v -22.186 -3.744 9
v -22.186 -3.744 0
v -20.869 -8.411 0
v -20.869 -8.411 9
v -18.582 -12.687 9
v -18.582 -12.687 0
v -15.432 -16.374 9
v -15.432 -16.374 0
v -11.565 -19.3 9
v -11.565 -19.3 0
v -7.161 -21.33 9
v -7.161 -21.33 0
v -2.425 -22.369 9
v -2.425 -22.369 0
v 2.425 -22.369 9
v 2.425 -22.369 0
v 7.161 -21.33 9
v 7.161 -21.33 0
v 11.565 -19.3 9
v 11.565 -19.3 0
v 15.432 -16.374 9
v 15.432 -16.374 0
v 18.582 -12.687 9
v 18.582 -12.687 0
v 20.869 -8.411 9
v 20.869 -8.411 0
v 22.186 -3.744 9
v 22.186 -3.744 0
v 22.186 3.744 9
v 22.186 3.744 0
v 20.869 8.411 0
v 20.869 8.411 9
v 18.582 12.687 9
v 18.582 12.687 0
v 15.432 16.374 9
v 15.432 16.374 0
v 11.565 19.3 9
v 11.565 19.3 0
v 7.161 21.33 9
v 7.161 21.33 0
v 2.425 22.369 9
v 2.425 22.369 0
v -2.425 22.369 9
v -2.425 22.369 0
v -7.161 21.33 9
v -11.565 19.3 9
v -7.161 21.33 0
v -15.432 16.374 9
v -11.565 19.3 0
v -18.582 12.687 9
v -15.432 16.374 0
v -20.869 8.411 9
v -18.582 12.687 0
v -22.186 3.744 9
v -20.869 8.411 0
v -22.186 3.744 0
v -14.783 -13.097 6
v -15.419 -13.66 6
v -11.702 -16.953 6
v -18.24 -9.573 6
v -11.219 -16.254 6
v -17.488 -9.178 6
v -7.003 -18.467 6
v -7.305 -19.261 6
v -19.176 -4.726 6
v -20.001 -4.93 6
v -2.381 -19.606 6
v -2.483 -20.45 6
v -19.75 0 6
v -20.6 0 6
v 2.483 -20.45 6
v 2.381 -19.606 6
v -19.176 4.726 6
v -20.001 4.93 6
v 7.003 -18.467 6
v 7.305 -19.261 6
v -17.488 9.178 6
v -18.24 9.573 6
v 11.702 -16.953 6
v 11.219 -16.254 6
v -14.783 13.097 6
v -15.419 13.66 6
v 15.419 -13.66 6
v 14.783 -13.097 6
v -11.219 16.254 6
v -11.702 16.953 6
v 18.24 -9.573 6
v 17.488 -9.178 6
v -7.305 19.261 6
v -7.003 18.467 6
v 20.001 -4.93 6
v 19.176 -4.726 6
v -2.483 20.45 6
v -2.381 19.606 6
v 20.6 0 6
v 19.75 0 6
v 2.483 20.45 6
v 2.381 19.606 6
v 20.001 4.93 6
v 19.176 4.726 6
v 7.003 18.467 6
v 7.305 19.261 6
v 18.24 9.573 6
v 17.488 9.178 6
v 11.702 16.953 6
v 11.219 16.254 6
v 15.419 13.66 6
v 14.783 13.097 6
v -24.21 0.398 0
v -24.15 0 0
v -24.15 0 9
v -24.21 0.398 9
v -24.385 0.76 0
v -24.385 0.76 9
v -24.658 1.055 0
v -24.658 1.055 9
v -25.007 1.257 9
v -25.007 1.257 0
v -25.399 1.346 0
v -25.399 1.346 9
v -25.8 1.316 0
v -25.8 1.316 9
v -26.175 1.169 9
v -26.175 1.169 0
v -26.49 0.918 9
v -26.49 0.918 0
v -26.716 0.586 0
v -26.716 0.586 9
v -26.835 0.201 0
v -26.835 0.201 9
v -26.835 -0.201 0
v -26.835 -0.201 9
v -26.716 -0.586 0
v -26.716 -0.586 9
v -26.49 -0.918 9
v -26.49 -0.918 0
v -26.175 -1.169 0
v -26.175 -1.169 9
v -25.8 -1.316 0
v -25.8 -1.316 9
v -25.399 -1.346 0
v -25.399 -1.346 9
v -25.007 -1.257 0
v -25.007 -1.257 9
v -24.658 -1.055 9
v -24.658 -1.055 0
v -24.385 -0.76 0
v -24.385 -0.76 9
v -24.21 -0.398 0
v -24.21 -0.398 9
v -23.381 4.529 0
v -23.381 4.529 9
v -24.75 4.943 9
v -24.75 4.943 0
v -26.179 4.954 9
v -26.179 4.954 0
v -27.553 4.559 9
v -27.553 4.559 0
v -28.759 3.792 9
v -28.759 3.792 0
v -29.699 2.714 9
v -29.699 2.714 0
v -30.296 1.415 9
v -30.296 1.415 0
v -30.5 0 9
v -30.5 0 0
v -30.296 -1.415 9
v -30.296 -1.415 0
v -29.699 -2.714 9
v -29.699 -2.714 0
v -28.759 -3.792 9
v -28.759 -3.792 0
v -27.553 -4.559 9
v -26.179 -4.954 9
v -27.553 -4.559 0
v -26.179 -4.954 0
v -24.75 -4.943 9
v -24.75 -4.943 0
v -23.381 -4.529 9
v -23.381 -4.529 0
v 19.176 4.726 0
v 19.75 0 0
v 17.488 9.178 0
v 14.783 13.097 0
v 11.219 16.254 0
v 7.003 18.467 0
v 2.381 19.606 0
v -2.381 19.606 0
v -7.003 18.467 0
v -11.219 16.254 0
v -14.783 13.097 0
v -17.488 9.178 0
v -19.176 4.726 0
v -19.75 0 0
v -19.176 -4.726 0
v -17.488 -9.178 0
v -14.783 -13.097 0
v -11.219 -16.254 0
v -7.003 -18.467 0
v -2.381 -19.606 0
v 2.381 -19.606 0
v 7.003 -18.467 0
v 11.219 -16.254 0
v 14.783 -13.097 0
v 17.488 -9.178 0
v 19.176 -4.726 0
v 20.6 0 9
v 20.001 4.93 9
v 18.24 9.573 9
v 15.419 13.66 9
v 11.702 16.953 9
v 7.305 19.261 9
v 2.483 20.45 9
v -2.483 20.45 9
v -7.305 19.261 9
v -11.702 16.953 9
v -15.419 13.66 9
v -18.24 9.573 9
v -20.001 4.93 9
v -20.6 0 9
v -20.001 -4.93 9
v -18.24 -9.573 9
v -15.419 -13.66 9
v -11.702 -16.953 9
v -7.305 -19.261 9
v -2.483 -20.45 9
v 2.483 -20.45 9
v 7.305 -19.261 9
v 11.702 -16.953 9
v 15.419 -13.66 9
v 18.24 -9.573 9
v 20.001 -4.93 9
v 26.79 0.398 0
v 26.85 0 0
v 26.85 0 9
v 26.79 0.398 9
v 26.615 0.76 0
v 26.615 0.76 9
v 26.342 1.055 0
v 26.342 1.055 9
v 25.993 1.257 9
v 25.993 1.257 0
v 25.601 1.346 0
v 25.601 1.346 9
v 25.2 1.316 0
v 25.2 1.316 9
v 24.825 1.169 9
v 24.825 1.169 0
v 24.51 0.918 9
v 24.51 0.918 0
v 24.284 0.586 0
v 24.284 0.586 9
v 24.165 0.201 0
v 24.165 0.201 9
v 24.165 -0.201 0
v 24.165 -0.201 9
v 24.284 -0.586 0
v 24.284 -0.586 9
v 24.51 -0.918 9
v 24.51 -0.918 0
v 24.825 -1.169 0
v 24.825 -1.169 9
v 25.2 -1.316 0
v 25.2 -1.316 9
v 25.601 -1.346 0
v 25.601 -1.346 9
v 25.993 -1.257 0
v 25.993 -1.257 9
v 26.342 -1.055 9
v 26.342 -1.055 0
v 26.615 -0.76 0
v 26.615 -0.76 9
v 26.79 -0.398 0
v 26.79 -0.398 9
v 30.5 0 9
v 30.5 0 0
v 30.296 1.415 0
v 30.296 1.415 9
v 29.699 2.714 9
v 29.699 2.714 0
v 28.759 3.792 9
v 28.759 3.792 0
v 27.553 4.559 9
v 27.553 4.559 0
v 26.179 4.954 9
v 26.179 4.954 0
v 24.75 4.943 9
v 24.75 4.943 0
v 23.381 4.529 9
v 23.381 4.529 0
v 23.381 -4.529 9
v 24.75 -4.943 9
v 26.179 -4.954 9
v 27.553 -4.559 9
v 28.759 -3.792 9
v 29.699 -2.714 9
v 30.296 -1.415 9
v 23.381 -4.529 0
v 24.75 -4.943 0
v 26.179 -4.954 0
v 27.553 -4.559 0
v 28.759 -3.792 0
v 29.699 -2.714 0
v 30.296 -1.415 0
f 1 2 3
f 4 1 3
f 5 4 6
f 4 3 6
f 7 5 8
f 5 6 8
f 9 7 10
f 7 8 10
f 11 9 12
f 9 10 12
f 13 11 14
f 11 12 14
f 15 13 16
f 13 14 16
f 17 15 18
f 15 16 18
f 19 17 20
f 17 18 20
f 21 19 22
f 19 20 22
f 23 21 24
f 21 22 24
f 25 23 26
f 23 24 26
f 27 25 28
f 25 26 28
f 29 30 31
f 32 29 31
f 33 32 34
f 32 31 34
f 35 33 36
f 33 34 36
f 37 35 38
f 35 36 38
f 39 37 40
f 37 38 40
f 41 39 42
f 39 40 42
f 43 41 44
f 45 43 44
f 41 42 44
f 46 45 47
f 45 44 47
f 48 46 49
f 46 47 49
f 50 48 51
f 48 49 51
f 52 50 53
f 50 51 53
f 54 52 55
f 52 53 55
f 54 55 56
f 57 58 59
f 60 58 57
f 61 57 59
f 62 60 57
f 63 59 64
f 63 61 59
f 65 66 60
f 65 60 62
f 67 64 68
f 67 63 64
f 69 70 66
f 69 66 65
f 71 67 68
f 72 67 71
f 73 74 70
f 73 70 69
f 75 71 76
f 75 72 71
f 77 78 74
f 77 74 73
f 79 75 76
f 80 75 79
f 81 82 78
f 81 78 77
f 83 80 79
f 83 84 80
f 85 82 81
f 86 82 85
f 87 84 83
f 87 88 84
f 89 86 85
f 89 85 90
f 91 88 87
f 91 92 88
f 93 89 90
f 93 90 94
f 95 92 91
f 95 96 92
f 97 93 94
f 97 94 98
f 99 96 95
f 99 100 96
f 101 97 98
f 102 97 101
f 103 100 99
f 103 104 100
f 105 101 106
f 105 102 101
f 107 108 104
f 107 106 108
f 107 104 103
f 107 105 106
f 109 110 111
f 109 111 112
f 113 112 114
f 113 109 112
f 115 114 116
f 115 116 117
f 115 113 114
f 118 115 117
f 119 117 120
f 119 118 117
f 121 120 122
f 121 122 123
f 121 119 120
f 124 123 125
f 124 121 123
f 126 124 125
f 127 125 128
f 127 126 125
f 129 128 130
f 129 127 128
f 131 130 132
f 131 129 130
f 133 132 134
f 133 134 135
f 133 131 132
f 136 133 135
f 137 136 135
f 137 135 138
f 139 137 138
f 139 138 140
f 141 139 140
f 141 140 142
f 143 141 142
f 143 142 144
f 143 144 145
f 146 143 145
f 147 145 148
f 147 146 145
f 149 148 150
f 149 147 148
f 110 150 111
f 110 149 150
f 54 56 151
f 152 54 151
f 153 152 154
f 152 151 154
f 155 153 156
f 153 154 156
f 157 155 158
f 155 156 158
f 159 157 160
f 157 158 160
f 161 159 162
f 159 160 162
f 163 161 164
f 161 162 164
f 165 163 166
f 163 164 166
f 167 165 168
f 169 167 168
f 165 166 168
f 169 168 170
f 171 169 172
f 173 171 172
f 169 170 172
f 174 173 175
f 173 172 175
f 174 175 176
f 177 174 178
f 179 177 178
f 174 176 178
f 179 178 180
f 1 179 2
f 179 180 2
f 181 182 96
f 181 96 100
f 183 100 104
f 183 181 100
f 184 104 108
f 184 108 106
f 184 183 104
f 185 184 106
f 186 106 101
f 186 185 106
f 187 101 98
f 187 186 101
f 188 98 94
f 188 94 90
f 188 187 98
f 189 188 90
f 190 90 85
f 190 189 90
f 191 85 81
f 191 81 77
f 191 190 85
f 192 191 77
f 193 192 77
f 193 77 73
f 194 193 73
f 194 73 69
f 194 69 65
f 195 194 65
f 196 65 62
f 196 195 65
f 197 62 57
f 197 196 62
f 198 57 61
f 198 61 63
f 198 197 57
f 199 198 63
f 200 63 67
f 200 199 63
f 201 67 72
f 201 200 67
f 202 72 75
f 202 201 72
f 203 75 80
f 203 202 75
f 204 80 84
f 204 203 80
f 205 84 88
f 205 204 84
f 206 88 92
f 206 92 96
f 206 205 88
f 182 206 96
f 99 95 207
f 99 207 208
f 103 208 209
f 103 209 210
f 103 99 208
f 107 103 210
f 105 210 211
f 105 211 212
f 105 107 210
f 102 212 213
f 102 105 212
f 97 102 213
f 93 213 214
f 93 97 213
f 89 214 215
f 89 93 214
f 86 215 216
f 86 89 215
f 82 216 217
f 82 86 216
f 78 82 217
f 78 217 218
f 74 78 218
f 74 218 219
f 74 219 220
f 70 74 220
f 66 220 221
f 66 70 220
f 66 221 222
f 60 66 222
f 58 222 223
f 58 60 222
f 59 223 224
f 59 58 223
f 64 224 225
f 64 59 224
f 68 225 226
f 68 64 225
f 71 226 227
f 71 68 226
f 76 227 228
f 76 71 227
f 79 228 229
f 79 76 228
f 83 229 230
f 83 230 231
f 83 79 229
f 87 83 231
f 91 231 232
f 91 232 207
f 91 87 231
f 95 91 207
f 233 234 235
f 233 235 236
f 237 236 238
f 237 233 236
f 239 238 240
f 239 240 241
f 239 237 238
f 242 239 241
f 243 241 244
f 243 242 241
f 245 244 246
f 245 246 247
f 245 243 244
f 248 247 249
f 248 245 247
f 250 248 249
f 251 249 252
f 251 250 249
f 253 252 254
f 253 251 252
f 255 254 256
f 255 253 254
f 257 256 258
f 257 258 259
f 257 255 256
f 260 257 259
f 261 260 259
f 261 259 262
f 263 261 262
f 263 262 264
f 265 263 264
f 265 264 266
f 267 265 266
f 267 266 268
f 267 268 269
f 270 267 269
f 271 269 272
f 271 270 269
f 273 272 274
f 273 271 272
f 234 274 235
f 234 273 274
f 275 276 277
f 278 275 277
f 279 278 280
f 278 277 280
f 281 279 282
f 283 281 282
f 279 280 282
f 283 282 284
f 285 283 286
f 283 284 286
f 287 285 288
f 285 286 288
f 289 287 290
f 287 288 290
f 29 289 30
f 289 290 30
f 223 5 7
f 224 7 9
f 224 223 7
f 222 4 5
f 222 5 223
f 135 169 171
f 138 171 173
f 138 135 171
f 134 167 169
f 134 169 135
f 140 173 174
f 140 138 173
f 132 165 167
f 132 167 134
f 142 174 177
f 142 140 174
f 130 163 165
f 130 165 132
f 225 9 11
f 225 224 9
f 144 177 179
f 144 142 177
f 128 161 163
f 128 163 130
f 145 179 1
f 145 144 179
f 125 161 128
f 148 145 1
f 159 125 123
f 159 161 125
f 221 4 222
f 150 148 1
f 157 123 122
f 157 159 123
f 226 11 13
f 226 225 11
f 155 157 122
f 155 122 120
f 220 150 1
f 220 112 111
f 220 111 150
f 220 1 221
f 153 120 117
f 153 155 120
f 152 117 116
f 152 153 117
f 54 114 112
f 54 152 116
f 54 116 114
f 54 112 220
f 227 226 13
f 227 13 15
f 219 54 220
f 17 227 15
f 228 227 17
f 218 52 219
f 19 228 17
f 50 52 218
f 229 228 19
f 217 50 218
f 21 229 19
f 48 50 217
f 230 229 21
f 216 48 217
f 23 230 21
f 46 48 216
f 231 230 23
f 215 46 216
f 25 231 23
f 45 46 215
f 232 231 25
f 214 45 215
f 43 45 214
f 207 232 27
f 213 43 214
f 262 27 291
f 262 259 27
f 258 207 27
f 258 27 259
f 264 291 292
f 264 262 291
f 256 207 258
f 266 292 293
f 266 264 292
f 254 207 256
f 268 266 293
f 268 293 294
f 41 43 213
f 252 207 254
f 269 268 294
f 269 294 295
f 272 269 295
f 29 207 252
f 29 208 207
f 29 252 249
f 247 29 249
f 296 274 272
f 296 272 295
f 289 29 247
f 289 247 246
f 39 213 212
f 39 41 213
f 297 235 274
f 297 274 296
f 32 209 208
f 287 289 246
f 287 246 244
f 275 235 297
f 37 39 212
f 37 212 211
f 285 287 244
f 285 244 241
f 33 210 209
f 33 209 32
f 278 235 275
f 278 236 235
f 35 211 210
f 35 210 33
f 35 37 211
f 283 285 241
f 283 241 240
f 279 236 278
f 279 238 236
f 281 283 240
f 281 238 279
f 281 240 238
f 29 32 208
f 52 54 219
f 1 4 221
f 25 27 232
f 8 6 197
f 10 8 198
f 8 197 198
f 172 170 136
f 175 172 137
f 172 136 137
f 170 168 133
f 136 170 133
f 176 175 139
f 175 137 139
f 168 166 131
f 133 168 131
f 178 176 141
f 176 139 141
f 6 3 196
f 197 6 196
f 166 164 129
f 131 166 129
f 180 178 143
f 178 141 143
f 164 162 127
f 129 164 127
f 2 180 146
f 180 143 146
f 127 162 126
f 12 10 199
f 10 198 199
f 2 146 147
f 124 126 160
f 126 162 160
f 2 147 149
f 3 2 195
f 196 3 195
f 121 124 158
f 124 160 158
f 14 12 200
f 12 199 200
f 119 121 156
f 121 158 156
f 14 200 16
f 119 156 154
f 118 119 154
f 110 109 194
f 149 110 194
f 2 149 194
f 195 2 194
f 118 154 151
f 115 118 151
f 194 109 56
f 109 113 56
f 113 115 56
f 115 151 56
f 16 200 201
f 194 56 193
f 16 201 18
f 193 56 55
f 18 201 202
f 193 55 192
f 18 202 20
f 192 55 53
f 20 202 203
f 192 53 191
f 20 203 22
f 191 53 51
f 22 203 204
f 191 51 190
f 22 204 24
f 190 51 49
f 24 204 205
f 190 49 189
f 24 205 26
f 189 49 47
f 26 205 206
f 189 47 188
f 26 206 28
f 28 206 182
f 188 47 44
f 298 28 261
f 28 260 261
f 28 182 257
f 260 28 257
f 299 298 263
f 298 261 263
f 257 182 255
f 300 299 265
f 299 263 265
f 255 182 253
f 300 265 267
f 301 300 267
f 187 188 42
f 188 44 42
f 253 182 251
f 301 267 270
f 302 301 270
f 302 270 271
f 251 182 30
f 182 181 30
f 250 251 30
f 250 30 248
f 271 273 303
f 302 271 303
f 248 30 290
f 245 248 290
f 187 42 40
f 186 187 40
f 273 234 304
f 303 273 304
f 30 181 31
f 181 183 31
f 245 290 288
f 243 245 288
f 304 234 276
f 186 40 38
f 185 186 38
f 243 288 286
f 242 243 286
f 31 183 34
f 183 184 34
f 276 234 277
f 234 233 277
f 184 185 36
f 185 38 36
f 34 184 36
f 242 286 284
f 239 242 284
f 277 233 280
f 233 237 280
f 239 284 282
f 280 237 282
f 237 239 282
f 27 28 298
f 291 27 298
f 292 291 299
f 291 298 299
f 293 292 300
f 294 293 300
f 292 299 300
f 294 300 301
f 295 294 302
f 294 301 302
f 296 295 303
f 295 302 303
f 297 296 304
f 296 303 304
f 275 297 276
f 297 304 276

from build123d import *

# Parameters (mm, degrees)
F0_R     = 1.35
F1_DEPTH = 9
F0_R_2   = 19.75
F2_DEPTH = 6
F3_R     = 22.5
F3_R_2   = 20.6
F4_DEPTH = 3


with BuildPart() as f1:
    # F0 (on Top) → F1 (new body)
    with BuildSketch(Plane.XY):
        with BuildLine():
            ThreePointArc((-22.1862745098, -3.7442253372), (-22.5, 0), (-22.1862745098, 3.7442253372))
            ThreePointArc((-22.1862745098, 3.7442253372), (-30.5, 0), (-22.1862745098, -3.7442253372))
        make_face()
        with Locations((-25.5, 0)):
            Circle(F0_R, mode=Mode.SUBTRACT)
    extrude(amount=F1_DEPTH)



with BuildPart() as f1b:
    # F0 (on Top) → F1, piece 2 (new body)
    with BuildSketch(Plane.XY):
        with BuildLine():
            ThreePointArc((22.1862745098, 3.7442253372), (22.4214314493, 1.8786728733), (22.5, 0))
            ThreePointArc((22.5, 0), (22.4214314493, -1.8786728733), (22.1862745098, -3.7442253372))
            ThreePointArc((22.1862745098, -3.7442253372), (27.5532136456, -4.5589816544), (30.5, 0))
            ThreePointArc((30.5, 0), (27.5532136456, 4.5589816544), (22.1862745098, 3.7442253372))
        make_face()
        with Locations((25.5, 0)):
            Circle(F0_R, mode=Mode.SUBTRACT)
    extrude(amount=F1_DEPTH)


with BuildPart() as f2:
    # F0 (on Top) → F2 (new body)
    with BuildSketch(Plane.XY):
        with BuildLine():
            ThreePointArc((22.1862745098, -3.7442253372), (20.5, 0), (22.1862745098, 3.7442253372))
            ThreePointArc((22.1862745098, 3.7442253372), (0, 22.5), (-22.1862745098, 3.7442253372))
            ThreePointArc((-22.1862745098, 3.7442253372), (-20.9410183456, 2.0532136456), (-20.5, 0))
            ThreePointArc((-20.5, 0), (-20.9410183456, -2.0532136456), (-22.1862745098, -3.7442253372))
            ThreePointArc((-22.1862745098, -3.7442253372), (0, -22.5), (22.1862745098, -3.7442253372))
        make_face()
        Circle(F0_R_2, mode=Mode.SUBTRACT)
        with BuildLine():
            ThreePointArc((22.1862745098, -3.7442253372), (22.4214314493, -1.8786728733), (22.5, 0))
            ThreePointArc((22.5, 0), (22.4214314493, 1.8786728733), (22.1862745098, 3.7442253372))
            ThreePointArc((22.1862745098, 3.7442253372), (20.5, 0), (22.1862745098, -3.7442253372))
        make_face()
        with BuildLine():
            ThreePointArc((-20.5, 0), (-20.9410183456, 2.0532136456), (-22.1862745098, 3.7442253372))
            ThreePointArc((-22.1862745098, 3.7442253372), (-22.5, 0), (-22.1862745098, -3.7442253372))
            ThreePointArc((-22.1862745098, -3.7442253372), (-20.9410183456, -2.0532136456), (-20.5, 0))
        make_face()
    extrude(amount=F2_DEPTH)


with BuildPart() as f1_1:
    add(f1.part)

    add(f1b.part)  # F4 merges F1b

    add(f2.part)  # F4 merges F2
    # F3 (on face) → F4 (join)
    with BuildSketch(Plane.XY.offset(6)):
        Circle(F3_R)
        Circle(F3_R_2, mode=Mode.SUBTRACT)
    extrude(amount=F4_DEPTH)


solid = f1_1.part
